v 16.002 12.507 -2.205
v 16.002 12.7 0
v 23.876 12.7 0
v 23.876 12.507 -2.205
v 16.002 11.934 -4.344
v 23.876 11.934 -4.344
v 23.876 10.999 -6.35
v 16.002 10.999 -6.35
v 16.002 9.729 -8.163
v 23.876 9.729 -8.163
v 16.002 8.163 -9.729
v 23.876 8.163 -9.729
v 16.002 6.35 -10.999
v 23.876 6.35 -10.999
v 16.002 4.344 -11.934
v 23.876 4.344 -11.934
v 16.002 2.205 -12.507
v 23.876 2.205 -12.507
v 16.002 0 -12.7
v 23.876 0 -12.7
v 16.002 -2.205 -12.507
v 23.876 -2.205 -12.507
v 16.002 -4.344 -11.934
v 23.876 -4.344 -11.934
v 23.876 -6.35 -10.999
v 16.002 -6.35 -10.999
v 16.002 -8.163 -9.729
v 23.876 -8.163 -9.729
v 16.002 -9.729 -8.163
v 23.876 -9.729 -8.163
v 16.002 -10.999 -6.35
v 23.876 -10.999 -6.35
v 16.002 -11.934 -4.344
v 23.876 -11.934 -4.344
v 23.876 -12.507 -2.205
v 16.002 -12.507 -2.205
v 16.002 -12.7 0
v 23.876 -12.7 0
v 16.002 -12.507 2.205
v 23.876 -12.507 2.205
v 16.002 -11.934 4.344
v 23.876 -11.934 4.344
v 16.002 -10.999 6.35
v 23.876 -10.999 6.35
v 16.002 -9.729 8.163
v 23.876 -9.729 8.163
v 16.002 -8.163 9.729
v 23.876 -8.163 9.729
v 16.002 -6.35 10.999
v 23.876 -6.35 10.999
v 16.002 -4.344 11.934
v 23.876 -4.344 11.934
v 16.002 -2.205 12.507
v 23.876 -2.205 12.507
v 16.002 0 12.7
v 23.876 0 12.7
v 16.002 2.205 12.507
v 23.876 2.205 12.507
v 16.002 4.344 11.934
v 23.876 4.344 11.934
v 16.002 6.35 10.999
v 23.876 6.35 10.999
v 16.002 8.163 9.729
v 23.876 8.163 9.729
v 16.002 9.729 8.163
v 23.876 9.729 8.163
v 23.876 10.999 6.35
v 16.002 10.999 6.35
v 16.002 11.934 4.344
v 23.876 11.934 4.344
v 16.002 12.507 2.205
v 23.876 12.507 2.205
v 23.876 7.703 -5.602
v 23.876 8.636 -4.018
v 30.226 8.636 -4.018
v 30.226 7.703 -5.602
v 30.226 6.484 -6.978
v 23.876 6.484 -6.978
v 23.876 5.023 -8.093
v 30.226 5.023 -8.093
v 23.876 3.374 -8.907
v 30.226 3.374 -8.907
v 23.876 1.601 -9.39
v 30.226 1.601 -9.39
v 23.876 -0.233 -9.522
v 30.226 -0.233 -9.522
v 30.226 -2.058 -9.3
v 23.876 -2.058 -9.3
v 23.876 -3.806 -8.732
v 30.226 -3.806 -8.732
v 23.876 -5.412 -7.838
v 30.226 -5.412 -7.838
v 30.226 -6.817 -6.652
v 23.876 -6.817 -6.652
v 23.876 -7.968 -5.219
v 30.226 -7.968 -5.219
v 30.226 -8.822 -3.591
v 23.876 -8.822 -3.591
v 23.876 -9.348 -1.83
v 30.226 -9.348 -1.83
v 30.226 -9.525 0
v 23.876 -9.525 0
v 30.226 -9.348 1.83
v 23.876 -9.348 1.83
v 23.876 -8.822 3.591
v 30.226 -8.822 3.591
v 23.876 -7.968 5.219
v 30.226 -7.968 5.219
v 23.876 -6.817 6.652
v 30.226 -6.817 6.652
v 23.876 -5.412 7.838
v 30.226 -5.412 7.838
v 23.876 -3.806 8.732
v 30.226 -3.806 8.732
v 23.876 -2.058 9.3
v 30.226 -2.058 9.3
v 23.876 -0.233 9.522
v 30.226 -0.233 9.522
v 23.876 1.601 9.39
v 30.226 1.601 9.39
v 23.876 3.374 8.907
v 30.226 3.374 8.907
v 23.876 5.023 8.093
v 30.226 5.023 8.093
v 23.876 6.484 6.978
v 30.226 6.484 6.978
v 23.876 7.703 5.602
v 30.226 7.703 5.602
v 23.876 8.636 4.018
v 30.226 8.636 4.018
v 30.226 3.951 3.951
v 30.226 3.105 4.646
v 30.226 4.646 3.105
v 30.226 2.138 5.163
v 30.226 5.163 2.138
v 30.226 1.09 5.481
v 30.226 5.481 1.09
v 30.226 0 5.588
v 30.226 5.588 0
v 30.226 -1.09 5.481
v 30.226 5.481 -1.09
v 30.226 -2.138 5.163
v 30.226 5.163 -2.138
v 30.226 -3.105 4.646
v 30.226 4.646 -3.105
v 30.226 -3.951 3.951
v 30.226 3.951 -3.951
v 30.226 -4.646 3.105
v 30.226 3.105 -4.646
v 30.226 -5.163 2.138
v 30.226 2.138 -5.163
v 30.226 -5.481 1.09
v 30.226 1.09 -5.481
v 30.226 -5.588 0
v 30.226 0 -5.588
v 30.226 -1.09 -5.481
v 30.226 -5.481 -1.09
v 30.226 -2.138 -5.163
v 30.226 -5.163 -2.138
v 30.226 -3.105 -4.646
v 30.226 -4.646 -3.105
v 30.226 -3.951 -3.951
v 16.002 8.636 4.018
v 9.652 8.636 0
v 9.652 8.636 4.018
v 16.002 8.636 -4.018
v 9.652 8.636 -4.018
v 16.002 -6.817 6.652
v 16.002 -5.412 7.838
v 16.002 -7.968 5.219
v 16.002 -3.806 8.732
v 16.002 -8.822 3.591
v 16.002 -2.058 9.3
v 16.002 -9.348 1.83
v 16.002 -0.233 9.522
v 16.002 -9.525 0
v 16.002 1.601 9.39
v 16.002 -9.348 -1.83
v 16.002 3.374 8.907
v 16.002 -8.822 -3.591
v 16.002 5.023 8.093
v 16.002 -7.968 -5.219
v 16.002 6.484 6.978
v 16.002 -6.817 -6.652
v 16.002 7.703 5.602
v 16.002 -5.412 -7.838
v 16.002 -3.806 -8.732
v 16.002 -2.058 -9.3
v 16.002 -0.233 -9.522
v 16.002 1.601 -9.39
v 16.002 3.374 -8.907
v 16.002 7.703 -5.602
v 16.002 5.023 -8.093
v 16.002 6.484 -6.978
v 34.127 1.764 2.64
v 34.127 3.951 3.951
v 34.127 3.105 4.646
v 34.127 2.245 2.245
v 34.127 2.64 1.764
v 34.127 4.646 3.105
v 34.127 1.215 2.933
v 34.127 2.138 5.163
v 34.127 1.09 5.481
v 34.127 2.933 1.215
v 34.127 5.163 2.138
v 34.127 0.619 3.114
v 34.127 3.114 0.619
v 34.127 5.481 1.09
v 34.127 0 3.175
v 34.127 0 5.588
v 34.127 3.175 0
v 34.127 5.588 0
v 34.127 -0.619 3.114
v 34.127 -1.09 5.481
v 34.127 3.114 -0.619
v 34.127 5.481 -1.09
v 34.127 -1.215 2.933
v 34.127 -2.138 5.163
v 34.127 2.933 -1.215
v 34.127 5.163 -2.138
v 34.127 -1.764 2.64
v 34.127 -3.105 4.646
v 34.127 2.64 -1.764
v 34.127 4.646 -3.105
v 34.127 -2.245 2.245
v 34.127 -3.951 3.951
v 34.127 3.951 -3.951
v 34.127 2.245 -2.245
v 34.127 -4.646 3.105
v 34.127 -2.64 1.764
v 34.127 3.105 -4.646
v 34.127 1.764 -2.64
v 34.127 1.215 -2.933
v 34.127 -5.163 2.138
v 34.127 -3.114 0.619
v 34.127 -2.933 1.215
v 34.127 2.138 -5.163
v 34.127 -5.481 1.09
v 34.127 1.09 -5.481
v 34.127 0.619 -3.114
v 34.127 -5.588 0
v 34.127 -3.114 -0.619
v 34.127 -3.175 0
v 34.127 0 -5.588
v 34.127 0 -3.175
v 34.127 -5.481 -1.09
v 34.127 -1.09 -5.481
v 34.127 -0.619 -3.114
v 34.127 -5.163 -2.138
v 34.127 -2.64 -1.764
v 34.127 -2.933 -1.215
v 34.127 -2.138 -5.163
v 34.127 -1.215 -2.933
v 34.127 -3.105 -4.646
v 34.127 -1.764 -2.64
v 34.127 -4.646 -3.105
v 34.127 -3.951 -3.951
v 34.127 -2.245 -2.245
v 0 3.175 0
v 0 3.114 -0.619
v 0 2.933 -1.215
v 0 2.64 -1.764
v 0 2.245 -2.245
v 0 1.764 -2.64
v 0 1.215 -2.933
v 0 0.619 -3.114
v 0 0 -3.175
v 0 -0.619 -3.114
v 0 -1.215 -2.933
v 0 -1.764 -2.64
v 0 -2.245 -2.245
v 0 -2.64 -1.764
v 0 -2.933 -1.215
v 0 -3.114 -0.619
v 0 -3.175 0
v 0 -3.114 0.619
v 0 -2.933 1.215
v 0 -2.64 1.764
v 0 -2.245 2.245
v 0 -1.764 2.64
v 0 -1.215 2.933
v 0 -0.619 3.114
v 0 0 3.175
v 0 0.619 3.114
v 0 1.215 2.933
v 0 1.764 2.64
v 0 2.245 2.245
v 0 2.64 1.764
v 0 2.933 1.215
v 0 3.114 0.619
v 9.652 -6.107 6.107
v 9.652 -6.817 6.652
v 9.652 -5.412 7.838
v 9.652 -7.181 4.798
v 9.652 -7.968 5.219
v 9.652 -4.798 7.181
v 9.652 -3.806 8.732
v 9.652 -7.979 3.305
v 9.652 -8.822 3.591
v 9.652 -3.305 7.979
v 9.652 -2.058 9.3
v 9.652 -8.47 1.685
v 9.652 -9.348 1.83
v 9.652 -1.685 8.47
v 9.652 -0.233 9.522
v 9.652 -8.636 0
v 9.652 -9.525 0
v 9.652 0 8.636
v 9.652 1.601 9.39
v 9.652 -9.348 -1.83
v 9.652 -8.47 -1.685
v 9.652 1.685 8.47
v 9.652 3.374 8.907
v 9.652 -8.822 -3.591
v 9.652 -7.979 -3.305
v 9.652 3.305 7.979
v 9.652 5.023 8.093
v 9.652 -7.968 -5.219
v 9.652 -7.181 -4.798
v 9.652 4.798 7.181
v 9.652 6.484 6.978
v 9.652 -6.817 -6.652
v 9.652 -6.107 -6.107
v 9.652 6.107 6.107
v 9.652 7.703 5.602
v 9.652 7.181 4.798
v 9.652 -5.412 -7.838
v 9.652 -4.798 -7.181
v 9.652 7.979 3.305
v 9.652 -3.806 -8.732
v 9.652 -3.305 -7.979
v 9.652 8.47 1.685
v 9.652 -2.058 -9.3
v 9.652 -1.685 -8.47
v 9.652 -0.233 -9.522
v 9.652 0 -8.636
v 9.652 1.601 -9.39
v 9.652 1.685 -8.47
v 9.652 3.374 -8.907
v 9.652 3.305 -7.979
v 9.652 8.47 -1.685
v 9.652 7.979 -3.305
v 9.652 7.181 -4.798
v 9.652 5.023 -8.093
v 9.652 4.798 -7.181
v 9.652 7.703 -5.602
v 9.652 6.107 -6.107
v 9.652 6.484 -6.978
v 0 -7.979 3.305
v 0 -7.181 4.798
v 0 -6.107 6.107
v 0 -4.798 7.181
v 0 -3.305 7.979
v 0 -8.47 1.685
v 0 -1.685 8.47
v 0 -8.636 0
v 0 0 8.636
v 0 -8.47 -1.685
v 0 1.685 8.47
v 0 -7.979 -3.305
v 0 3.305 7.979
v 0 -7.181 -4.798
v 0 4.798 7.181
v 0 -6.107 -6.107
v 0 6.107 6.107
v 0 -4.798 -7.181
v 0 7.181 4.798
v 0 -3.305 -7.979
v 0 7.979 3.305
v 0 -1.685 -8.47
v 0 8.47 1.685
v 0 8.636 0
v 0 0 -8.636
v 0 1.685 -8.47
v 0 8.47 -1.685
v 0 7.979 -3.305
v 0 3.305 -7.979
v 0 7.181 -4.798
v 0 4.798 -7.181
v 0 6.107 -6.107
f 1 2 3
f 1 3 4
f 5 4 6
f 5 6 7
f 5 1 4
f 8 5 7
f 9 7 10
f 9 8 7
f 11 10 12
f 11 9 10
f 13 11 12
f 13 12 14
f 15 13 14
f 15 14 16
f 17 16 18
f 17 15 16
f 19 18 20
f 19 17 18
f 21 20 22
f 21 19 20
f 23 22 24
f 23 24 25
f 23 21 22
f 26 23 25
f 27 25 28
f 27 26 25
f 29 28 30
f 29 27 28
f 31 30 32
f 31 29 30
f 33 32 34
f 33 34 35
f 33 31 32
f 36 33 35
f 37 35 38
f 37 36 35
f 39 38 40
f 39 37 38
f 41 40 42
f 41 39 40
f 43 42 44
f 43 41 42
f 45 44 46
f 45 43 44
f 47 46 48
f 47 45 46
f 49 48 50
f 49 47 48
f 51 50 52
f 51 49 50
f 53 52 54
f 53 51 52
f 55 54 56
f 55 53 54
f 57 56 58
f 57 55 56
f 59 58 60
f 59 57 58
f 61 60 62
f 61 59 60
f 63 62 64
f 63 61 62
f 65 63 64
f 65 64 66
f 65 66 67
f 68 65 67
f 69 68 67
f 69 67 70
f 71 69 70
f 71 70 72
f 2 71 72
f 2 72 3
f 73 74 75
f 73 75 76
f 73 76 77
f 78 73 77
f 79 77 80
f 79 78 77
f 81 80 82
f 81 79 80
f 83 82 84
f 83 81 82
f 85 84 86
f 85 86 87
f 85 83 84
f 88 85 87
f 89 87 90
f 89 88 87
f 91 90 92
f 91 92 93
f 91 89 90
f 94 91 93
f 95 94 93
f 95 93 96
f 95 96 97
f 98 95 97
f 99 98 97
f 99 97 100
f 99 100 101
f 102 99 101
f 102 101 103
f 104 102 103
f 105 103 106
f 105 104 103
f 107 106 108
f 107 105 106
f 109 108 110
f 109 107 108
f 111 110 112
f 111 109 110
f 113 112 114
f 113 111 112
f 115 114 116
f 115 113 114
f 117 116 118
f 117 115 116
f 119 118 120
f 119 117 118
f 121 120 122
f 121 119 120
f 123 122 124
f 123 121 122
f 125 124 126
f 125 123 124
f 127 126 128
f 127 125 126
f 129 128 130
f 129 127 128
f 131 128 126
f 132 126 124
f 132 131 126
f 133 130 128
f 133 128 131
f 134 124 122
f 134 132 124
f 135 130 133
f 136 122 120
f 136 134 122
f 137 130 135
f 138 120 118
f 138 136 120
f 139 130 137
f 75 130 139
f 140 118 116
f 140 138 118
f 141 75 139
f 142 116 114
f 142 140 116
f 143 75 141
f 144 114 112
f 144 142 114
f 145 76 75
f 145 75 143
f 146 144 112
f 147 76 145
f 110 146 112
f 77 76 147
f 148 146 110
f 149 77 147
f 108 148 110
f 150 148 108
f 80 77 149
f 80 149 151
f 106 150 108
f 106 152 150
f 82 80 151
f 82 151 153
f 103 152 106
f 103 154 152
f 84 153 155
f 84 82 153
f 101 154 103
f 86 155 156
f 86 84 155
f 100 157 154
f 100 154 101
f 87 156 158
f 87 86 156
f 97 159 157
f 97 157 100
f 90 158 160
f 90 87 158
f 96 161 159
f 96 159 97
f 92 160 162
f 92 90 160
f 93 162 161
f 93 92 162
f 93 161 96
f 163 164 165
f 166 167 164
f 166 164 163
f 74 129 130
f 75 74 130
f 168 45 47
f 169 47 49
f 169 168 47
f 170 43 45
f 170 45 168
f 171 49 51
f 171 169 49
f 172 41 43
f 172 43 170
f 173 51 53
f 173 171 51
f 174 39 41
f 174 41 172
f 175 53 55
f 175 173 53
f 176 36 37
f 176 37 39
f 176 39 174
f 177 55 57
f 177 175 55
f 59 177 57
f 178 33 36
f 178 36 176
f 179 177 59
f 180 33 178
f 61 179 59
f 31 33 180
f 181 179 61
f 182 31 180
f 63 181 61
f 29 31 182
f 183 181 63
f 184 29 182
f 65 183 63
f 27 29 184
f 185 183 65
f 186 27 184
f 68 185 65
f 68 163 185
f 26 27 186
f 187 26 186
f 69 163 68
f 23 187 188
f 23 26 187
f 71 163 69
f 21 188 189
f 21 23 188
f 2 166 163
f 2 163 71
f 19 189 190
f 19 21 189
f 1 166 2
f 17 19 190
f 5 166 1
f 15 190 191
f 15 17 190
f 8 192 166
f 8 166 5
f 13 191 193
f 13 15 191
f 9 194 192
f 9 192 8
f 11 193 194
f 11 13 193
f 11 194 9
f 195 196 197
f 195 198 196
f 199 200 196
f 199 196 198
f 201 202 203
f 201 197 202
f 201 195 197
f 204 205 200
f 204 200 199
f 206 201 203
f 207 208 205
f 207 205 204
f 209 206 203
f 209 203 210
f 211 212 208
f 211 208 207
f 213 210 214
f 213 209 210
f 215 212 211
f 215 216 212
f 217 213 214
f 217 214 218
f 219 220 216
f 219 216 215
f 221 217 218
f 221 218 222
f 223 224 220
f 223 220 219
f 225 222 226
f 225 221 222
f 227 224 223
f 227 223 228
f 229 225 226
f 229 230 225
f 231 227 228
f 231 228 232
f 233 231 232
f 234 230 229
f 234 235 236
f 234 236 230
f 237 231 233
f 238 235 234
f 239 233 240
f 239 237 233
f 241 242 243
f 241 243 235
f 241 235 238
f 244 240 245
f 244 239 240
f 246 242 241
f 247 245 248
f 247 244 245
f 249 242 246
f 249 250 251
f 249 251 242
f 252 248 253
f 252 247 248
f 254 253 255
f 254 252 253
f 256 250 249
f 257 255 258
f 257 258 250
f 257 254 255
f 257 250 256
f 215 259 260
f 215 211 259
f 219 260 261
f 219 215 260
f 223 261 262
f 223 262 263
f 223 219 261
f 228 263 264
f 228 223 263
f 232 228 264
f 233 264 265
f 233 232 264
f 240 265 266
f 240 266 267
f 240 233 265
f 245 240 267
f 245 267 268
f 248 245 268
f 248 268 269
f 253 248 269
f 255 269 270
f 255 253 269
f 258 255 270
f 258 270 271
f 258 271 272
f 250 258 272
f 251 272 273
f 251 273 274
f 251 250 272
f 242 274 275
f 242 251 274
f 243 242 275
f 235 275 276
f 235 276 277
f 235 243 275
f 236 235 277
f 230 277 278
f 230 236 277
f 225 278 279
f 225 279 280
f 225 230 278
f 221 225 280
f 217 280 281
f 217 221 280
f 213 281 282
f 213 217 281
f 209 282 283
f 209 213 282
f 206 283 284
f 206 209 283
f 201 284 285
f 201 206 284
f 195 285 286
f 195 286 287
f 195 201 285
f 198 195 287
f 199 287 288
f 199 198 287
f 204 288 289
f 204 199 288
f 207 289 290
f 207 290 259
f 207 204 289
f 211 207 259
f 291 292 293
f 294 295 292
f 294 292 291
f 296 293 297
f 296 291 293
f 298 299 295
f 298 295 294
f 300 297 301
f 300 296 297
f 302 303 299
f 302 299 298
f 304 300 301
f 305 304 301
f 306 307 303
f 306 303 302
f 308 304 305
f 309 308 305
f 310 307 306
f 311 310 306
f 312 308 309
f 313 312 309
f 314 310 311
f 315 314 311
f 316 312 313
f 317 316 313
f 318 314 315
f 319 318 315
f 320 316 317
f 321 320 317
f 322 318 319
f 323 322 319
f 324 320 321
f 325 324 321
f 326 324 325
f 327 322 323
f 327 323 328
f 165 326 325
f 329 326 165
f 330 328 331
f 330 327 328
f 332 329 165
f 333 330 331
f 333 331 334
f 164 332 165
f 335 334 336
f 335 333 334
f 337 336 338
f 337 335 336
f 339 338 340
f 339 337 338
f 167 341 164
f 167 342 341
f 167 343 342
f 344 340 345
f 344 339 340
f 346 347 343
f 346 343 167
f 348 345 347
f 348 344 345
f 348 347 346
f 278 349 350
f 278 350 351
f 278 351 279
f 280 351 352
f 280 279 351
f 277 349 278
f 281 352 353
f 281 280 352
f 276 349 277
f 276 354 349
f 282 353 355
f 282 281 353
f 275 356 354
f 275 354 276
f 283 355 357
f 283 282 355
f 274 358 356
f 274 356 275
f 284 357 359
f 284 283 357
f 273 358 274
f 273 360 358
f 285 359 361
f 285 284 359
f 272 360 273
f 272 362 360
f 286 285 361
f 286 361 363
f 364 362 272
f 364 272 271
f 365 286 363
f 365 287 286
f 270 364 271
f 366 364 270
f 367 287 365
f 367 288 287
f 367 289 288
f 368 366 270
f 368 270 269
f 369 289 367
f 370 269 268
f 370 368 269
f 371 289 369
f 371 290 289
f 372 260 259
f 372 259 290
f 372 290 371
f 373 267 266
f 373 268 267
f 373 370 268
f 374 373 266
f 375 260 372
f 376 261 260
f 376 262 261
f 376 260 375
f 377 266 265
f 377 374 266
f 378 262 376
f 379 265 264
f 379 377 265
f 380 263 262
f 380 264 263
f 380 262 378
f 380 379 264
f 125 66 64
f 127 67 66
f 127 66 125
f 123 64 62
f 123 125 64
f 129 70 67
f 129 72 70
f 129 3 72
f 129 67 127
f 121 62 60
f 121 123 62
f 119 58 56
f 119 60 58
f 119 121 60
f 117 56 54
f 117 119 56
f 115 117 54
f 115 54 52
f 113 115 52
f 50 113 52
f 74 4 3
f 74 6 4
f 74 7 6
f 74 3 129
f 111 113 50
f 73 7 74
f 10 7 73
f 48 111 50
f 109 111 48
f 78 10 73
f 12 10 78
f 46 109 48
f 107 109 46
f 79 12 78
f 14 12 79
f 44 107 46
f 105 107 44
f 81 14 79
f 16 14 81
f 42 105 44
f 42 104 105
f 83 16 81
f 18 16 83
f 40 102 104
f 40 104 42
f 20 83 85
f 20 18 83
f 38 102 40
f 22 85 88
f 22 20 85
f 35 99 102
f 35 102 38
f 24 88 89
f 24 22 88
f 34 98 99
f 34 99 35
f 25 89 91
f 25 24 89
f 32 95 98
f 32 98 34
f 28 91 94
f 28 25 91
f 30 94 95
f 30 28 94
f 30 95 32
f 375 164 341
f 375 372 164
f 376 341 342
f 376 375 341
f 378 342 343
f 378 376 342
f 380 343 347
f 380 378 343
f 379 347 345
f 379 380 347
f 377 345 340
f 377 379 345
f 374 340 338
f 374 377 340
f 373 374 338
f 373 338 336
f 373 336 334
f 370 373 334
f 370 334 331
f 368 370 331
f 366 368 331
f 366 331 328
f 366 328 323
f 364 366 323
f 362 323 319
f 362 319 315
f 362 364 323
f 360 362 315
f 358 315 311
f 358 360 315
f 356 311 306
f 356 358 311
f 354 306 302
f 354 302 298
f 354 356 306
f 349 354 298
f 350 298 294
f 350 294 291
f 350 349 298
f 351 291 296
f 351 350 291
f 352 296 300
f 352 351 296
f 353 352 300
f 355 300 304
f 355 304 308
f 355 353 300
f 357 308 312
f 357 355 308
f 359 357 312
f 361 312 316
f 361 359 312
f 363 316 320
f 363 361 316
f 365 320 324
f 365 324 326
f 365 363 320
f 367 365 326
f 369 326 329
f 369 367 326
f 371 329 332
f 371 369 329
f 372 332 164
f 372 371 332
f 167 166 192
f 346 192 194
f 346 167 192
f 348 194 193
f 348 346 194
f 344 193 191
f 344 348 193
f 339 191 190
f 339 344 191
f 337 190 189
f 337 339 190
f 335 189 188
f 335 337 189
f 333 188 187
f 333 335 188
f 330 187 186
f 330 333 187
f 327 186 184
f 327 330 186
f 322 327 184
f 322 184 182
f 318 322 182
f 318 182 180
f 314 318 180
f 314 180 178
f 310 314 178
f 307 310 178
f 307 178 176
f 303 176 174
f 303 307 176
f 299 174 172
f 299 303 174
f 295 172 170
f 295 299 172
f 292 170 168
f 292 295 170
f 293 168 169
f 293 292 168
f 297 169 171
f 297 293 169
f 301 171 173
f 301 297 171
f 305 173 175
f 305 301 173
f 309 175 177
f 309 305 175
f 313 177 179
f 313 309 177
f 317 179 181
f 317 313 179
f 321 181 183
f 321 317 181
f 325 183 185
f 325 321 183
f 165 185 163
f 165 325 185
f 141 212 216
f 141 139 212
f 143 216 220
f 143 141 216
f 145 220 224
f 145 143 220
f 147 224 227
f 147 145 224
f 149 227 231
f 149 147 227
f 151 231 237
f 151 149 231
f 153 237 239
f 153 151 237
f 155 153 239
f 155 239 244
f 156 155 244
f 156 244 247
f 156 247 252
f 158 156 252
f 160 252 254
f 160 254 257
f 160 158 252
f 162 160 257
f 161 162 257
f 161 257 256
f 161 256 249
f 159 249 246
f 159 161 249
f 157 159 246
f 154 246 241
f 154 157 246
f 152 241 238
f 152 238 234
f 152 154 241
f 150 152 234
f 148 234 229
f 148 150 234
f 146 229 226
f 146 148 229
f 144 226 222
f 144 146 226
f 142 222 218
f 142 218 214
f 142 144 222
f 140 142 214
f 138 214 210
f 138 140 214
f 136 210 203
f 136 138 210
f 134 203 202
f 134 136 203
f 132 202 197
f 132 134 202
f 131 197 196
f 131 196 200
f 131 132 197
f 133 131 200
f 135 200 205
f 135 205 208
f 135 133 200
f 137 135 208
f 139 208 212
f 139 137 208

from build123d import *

# Parameters (mm, degrees)
CUT_EXTRUDE1_DEPTH      = 39.565038065
CUT_EXTRUDE1_DEPTH_BACK = 39.565038065
SKETCH2_W               = 6.35
SKETCH2_H               = 0.889


with BuildPart() as part:
    # Sketch1 → Revolve1 (revolve)
    with BuildSketch(Plane.XY):
        Polygon((0, 8.636), (0, 3.175), (34.12744, 3.175), (34.12744, 5.588), (30.226, 5.588), (30.226, 9.525), (23.876, 9.525), (23.876, 12.7), (16.002, 12.7), (16.002, 9.525), (9.652, 9.525), (9.652, 8.636), align=None)
    revolve(axis=Axis((34.12744, 0, 0), (-1, 0, 0)))

    # Sketch2 → Cut-Extrude1 (cut, two sides: drawn at the far end of the back side and taken through both)
    with BuildSketch(Plane.XY.offset(-CUT_EXTRUDE1_DEPTH_BACK)):
        with Locations((12.827, 9.0805)):
            Rectangle(SKETCH2_W, SKETCH2_H)
        with Locations((27.051, 9.0805)):
            Rectangle(SKETCH2_W, SKETCH2_H)
    extrude(amount=CUT_EXTRUDE1_DEPTH + CUT_EXTRUDE1_DEPTH_BACK, mode=Mode.SUBTRACT)


solid = part.part
